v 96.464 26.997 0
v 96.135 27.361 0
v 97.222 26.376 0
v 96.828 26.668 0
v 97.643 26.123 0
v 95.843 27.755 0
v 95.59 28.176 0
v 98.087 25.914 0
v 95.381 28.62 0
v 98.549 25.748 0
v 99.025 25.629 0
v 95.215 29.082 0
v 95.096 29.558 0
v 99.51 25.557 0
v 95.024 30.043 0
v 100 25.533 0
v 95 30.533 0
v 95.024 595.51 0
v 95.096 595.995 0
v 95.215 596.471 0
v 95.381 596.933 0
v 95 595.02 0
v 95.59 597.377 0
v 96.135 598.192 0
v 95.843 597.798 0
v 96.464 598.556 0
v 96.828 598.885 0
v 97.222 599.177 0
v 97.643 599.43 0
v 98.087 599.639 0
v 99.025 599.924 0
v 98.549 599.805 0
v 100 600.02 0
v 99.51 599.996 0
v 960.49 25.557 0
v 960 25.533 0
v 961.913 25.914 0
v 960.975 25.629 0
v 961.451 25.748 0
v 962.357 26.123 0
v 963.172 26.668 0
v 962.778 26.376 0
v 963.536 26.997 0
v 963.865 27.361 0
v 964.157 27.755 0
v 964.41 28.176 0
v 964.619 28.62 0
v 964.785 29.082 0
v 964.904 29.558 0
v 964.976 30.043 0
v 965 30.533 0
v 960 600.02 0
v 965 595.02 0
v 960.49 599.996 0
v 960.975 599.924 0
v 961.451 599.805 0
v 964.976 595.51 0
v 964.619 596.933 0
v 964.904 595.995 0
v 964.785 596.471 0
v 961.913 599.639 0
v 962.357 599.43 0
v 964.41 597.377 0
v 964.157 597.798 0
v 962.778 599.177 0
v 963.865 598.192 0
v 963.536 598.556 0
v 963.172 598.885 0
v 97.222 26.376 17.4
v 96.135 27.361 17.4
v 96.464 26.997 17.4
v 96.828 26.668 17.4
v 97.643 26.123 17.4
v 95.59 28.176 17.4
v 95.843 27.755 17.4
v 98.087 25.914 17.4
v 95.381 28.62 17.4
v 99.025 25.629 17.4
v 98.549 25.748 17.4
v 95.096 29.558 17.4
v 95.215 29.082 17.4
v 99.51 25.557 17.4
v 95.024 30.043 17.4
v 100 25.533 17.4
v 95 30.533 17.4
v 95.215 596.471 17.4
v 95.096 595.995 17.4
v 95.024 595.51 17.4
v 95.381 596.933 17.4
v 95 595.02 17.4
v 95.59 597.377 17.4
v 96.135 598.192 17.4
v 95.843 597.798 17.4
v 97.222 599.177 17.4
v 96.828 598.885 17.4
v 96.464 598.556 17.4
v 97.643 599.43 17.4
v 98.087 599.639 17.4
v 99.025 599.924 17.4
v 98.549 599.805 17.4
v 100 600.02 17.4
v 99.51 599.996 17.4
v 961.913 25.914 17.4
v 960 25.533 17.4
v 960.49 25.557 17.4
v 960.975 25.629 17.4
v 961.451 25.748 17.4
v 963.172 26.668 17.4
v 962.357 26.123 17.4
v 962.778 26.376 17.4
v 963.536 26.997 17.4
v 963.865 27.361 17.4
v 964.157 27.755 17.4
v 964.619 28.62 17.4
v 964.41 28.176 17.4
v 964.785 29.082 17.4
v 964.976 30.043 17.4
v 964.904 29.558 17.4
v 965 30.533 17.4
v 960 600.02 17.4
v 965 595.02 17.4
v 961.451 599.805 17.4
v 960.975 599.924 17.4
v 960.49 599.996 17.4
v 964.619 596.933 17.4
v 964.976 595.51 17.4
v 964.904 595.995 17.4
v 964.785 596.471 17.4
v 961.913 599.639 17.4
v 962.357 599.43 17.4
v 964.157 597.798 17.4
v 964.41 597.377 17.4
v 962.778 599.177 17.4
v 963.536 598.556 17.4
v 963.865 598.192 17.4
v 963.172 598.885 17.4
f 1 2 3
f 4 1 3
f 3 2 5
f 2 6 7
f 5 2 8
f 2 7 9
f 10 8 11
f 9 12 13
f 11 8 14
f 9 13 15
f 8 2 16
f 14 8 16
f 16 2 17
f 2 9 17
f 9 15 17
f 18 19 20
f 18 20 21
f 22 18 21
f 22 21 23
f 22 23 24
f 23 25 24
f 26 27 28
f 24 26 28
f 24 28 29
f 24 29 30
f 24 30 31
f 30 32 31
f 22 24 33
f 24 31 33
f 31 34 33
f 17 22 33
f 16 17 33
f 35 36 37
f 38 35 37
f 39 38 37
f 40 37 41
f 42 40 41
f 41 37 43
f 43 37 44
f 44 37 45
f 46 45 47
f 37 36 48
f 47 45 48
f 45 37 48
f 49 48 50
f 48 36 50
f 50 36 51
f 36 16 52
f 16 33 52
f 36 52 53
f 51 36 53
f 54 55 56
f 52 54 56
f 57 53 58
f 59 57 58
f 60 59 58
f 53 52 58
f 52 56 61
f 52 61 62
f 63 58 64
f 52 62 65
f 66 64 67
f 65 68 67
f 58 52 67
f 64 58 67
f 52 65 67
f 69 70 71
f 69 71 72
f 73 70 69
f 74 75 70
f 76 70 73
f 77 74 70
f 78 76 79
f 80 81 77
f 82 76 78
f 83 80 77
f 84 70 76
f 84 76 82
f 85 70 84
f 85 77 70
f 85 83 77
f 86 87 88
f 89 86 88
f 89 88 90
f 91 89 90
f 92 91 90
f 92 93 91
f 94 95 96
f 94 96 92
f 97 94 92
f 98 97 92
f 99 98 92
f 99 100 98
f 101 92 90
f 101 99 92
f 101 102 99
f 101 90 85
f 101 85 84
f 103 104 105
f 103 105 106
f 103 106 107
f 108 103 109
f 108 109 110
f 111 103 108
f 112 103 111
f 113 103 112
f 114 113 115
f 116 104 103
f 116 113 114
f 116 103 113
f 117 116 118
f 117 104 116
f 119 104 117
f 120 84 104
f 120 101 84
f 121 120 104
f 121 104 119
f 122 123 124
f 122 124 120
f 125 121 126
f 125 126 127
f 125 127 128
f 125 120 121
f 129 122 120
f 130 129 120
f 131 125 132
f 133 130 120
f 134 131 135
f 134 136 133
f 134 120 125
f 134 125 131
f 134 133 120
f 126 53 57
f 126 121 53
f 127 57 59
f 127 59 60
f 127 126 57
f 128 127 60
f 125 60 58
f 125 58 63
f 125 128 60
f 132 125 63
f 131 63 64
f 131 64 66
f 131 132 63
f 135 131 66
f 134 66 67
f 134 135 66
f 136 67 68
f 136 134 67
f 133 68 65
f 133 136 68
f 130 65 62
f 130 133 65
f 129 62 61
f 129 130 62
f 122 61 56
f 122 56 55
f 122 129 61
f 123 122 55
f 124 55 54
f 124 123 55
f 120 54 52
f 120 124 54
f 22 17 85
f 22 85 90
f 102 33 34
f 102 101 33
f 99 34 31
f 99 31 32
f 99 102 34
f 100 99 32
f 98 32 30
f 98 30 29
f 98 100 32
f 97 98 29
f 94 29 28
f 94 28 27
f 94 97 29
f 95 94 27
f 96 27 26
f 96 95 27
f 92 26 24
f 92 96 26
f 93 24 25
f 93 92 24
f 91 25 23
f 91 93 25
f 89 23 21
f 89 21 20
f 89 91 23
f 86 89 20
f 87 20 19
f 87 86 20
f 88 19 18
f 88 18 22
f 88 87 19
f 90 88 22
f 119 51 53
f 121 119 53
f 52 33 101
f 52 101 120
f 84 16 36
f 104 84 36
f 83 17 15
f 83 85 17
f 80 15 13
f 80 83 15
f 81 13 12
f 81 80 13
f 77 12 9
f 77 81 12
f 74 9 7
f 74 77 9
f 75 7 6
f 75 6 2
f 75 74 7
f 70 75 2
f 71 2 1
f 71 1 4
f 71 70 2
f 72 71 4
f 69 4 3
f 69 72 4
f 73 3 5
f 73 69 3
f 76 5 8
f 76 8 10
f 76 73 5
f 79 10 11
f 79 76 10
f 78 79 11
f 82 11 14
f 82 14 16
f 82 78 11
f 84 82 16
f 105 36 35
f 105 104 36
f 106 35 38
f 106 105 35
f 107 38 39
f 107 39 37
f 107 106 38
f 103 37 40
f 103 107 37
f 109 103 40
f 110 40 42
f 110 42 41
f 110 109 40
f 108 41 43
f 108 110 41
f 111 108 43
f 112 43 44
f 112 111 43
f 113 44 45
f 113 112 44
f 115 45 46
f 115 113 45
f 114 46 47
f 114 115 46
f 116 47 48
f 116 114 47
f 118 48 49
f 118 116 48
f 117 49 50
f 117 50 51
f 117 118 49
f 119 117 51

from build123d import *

# Parameters (mm, degrees)
SKETCH1_W           = 870
SKETCH1_H           = 574.487
BOSS_EXTRUDE1_DEPTH = 17.4
FILLET1_R           = 5
FILLET2_R           = 5
FILLET3_R           = 5
FILLET4_R           = 5


with BuildPart() as part:
    # Sketch1 → Boss-Extrude1 (new body)
    with BuildSketch(Plane.XY):
        with Locations((530, 312.7765)):
            Rectangle(SKETCH1_W, SKETCH1_H)
    extrude(amount=BOSS_EXTRUDE1_DEPTH)

    # Fillet1
    fillet1_edges = [part.edges().sort_by_distance(p)[0] for p in [
        (965, 600.02, 8.7),
    ]]
    fillet(fillet1_edges, radius=FILLET1_R)

    # Fillet2
    fillet2_edges = [part.edges().sort_by_distance(p)[0] for p in [
        (95, 600.02, 8.7),
    ]]
    fillet(fillet2_edges, radius=FILLET2_R)

    # Fillet3
    fillet3_edges = [part.edges().sort_by_distance(p)[0] for p in [
        (95, 25.533, 8.7),
    ]]
    fillet(fillet3_edges, radius=FILLET3_R)

    # Fillet4
    fillet4_edges = [part.edges().sort_by_distance(p)[0] for p in [
        (965, 25.533, 8.7),
    ]]
    fillet(fillet4_edges, radius=FILLET4_R)


solid = part.part
